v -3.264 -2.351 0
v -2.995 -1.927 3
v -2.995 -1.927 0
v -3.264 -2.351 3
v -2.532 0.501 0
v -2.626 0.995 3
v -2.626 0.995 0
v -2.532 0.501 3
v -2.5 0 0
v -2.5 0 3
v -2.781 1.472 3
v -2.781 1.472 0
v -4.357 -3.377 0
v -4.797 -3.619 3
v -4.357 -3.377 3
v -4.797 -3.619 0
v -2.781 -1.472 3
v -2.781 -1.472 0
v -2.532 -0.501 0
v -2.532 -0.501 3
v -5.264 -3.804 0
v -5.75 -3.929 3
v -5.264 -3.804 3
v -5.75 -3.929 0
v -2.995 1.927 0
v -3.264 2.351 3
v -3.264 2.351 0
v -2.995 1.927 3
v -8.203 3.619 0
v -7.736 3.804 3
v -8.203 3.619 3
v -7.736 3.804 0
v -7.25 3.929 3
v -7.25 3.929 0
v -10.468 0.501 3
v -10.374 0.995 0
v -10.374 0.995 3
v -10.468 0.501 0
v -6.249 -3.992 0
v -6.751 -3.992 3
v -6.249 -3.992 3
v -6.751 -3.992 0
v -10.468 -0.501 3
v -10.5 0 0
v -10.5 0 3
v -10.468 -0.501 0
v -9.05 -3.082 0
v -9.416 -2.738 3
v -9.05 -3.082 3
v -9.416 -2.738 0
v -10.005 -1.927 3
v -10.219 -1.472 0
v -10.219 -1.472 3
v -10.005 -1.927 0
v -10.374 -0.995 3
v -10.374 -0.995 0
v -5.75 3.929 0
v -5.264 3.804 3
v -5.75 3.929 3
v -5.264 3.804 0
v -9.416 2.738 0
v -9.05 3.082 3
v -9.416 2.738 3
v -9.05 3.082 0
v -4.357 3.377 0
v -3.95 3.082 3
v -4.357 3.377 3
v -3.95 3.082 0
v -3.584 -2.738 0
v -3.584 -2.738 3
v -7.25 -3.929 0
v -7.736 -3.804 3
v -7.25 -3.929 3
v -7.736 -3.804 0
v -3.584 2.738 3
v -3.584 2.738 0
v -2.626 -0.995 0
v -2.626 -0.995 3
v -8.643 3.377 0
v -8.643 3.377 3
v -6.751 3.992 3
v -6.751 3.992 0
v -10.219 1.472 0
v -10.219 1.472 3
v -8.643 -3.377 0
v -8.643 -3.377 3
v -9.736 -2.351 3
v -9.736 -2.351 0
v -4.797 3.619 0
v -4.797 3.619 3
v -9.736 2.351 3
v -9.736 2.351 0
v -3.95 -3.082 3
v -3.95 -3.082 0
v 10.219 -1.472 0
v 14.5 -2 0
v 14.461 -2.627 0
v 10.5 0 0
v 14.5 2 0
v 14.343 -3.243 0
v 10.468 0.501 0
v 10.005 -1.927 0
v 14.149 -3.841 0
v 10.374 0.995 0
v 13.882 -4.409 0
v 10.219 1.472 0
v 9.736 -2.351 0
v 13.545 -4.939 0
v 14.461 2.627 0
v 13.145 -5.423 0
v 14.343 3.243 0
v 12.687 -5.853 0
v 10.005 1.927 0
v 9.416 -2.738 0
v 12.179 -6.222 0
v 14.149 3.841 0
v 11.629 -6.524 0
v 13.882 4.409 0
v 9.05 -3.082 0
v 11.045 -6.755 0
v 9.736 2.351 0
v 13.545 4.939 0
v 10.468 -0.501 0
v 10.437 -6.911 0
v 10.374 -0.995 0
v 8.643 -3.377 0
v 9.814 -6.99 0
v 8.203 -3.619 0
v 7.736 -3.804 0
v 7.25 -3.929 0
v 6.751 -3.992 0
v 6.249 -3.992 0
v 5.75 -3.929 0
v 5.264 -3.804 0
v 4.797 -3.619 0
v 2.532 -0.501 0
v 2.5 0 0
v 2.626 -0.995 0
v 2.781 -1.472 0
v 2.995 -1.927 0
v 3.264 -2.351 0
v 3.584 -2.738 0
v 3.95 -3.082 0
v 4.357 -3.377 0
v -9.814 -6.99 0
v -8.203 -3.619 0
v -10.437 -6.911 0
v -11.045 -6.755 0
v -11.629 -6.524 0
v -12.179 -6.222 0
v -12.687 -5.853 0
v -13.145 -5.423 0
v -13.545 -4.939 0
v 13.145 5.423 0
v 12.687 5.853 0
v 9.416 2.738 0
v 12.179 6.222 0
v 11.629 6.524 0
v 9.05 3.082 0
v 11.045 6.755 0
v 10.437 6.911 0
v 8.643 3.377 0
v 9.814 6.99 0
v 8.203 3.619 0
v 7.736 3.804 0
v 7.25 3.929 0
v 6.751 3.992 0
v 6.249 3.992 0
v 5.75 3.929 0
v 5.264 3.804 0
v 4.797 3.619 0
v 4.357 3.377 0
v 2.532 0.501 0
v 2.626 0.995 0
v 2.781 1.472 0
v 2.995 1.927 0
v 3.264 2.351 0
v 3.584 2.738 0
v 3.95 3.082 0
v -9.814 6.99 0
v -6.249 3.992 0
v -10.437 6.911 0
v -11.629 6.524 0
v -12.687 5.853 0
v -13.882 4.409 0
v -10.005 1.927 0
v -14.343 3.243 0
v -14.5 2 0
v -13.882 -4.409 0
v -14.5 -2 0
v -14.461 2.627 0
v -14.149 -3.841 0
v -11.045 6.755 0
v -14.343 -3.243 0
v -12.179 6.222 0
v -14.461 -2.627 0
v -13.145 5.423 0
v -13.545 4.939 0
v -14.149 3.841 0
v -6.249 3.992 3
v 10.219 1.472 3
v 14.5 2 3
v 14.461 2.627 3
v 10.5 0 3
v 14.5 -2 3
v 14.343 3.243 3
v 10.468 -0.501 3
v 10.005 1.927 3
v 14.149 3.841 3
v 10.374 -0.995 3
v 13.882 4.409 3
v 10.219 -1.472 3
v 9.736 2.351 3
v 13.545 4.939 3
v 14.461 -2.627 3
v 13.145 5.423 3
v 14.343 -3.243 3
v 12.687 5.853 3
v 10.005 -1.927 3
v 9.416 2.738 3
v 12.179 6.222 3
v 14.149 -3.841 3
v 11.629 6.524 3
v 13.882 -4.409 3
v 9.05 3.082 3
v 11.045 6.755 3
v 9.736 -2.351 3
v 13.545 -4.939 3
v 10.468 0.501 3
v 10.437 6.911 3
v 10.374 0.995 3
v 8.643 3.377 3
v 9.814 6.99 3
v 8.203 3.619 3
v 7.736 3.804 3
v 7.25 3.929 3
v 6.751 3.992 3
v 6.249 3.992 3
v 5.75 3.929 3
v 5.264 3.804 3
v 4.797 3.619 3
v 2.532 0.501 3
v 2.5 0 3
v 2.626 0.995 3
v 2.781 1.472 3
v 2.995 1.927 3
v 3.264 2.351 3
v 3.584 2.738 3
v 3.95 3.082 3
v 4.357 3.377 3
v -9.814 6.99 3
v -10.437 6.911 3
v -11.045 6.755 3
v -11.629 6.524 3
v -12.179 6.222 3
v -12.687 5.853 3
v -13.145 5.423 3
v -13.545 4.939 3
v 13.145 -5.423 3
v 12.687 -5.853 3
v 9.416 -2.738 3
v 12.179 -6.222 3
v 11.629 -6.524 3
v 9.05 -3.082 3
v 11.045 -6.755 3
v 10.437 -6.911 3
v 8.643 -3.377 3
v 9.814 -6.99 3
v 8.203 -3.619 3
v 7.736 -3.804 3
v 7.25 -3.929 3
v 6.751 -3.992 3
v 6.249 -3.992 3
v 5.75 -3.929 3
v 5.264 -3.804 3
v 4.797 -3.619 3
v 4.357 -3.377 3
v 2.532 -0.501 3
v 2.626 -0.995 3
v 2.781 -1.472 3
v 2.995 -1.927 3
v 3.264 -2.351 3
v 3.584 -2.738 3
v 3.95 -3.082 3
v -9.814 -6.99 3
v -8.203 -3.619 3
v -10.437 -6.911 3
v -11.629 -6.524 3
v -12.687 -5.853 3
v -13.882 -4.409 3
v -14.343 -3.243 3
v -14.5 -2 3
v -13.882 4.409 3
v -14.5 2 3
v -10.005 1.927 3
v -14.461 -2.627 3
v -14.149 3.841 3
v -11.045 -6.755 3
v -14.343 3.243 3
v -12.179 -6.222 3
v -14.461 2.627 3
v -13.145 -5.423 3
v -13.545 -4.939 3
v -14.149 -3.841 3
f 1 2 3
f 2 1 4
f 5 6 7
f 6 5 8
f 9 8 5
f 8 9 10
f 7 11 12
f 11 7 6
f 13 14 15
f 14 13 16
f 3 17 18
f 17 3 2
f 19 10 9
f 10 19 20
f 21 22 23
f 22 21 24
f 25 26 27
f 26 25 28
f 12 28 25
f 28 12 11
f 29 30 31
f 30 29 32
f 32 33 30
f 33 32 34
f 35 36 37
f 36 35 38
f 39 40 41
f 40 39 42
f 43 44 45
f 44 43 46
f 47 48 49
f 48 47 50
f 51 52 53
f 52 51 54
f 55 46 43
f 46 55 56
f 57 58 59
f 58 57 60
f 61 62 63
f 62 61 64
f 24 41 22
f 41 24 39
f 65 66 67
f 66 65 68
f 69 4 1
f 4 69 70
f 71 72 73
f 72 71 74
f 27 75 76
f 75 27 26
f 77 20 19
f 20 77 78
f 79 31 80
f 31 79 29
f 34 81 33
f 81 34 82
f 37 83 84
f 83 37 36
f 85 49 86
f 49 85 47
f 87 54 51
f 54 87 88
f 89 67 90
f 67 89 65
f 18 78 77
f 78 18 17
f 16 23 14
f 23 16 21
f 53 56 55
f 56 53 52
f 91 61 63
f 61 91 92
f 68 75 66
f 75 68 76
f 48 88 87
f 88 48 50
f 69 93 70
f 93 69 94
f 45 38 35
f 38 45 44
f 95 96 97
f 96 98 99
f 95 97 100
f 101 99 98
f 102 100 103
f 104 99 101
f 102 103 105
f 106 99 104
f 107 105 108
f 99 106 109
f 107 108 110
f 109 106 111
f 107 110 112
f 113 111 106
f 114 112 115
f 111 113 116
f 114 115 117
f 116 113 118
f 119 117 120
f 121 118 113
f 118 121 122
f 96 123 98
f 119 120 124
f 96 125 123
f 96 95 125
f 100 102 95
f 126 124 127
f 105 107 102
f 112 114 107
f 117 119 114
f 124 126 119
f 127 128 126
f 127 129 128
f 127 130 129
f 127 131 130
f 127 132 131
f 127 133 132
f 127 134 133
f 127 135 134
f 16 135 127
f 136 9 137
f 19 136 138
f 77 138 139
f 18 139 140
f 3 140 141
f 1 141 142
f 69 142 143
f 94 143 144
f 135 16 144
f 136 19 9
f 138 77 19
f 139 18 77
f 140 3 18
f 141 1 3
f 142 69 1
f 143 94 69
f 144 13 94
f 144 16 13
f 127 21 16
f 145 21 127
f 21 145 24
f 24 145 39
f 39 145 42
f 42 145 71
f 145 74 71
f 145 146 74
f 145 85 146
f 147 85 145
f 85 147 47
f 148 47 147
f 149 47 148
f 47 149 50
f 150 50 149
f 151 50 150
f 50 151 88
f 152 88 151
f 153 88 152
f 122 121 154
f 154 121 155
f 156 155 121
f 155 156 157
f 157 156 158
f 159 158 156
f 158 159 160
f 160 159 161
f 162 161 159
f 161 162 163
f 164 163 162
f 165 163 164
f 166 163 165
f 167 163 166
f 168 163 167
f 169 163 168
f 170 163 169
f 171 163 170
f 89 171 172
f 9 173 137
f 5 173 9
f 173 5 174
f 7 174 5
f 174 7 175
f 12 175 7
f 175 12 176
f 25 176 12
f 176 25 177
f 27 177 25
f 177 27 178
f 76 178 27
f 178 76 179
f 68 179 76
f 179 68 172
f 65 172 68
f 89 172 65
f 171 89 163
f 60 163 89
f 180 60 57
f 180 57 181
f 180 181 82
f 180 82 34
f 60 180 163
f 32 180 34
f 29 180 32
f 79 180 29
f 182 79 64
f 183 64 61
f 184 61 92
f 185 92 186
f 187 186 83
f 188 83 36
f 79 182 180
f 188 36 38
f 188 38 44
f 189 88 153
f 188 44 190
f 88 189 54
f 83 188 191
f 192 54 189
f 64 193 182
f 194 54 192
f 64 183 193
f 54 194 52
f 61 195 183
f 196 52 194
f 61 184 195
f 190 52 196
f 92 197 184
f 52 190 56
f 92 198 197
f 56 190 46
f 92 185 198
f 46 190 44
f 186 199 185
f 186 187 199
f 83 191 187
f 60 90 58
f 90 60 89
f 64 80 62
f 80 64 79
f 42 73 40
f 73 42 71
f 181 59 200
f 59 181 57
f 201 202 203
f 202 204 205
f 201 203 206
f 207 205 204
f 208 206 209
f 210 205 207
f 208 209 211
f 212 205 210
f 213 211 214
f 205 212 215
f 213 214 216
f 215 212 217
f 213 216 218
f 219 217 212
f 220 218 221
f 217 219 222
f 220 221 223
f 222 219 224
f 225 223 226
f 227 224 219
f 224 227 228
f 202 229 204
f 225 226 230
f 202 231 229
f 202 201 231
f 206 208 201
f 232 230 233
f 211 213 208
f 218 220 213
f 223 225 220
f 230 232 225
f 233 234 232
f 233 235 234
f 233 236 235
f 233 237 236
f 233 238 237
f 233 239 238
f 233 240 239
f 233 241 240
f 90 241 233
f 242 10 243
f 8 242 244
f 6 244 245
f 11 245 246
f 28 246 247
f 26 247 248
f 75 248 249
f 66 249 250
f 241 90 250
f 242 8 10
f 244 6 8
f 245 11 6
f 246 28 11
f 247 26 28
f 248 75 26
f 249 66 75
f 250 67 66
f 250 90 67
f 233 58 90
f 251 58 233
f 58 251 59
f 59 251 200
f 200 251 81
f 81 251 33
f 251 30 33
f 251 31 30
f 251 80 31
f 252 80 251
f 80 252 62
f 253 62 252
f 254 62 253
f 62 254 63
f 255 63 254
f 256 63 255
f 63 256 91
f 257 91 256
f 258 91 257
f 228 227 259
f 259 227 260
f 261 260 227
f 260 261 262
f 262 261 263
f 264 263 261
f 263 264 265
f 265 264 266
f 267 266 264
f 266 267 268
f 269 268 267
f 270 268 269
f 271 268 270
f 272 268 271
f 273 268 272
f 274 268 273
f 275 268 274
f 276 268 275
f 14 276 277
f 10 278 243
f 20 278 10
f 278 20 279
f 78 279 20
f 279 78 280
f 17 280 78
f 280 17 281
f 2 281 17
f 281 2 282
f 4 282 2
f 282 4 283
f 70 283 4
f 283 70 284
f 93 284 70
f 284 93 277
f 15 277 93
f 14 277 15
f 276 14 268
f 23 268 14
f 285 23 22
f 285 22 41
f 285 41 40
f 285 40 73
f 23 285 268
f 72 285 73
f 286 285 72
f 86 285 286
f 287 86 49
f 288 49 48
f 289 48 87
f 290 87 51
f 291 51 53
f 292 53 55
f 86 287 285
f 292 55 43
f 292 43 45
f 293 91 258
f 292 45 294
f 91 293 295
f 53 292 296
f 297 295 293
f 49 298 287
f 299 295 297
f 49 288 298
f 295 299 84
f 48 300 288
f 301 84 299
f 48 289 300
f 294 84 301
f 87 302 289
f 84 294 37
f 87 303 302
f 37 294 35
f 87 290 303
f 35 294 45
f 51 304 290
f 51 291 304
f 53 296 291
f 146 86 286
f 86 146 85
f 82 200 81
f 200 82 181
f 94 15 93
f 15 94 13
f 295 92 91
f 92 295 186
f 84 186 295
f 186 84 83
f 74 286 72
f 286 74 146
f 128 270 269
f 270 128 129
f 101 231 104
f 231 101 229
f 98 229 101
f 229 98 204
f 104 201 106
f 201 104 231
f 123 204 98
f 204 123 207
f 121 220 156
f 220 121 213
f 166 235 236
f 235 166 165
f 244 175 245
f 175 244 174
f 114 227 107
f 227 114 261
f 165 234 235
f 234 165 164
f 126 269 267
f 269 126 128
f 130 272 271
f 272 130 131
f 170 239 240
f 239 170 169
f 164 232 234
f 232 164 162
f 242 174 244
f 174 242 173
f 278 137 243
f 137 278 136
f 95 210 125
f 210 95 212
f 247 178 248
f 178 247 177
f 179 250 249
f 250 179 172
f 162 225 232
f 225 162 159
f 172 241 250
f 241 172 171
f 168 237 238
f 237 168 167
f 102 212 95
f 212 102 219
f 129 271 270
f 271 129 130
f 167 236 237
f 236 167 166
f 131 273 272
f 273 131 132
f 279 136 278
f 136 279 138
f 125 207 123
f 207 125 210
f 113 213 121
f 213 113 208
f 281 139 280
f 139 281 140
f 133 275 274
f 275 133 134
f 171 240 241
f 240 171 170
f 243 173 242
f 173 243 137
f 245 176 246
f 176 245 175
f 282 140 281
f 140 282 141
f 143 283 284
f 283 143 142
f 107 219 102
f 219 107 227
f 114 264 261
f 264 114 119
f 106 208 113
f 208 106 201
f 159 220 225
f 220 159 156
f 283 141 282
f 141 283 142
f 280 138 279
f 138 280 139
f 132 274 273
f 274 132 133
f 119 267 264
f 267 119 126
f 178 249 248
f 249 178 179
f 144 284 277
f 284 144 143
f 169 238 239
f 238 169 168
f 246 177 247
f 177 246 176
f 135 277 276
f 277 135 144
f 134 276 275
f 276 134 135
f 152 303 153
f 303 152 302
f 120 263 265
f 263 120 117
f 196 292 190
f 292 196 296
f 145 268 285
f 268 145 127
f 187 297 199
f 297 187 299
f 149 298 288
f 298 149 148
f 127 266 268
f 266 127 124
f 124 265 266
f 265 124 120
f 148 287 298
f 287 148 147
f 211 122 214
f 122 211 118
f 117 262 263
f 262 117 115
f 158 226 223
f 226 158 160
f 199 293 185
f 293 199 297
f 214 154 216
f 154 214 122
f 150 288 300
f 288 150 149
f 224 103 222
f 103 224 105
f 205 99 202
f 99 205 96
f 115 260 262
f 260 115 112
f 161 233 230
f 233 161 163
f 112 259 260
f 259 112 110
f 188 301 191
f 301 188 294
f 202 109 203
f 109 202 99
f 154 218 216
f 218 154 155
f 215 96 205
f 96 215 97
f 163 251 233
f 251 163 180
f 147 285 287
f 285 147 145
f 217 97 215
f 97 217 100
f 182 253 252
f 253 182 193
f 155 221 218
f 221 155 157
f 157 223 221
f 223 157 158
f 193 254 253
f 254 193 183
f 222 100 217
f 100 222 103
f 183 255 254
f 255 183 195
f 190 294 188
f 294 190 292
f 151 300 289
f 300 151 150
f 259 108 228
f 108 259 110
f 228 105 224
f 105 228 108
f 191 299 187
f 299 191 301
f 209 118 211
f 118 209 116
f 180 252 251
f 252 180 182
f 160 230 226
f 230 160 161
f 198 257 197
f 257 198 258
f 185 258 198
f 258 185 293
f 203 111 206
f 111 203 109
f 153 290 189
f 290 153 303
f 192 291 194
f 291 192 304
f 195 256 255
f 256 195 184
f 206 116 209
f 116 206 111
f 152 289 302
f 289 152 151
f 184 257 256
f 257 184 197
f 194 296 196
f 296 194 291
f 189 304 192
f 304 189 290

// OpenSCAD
$fn = 50;


difference() {
	union() {
		hull() {
			translate(v = [-9.5000000000, 2.0000000000, 0]) {
				cylinder(h = 3, r = 5);
			}
			translate(v = [9.5000000000, 2.0000000000, 0]) {
				cylinder(h = 3, r = 5);
			}
			translate(v = [-9.5000000000, -2.0000000000, 0]) {
				cylinder(h = 3, r = 5);
			}
			translate(v = [9.5000000000, -2.0000000000, 0]) {
				cylinder(h = 3, r = 5);
			}
		}
	}
	union() {
		#translate(v = [-7.5000000000, 0.0000000000, -100.0000000000]) {
			cylinder(h = 200, r = 3.0000000000);
		}
		#translate(v = [-7.5000000000, 0.0000000000, -100.0000000000]) {
			cylinder(h = 200, r = 3.0000000000);
		}
		#translate(v = [7.5000000000, 0.0000000000, -100.0000000000]) {
			cylinder(h = 200, r = 3.0000000000);
		}
		#translate(v = [7.5000000000, 0.0000000000, -100.0000000000]) {
			cylinder(h = 200, r = 3.0000000000);
		}
		#translate(v = [-6.5000000000, 0, 0]) {
			cylinder(h = 3, r = 4.0000000000);
		}
		#translate(v = [6.5000000000, 0, 0]) {
			cylinder(h = 3, r = 4.0000000000);
		}
	}
}
